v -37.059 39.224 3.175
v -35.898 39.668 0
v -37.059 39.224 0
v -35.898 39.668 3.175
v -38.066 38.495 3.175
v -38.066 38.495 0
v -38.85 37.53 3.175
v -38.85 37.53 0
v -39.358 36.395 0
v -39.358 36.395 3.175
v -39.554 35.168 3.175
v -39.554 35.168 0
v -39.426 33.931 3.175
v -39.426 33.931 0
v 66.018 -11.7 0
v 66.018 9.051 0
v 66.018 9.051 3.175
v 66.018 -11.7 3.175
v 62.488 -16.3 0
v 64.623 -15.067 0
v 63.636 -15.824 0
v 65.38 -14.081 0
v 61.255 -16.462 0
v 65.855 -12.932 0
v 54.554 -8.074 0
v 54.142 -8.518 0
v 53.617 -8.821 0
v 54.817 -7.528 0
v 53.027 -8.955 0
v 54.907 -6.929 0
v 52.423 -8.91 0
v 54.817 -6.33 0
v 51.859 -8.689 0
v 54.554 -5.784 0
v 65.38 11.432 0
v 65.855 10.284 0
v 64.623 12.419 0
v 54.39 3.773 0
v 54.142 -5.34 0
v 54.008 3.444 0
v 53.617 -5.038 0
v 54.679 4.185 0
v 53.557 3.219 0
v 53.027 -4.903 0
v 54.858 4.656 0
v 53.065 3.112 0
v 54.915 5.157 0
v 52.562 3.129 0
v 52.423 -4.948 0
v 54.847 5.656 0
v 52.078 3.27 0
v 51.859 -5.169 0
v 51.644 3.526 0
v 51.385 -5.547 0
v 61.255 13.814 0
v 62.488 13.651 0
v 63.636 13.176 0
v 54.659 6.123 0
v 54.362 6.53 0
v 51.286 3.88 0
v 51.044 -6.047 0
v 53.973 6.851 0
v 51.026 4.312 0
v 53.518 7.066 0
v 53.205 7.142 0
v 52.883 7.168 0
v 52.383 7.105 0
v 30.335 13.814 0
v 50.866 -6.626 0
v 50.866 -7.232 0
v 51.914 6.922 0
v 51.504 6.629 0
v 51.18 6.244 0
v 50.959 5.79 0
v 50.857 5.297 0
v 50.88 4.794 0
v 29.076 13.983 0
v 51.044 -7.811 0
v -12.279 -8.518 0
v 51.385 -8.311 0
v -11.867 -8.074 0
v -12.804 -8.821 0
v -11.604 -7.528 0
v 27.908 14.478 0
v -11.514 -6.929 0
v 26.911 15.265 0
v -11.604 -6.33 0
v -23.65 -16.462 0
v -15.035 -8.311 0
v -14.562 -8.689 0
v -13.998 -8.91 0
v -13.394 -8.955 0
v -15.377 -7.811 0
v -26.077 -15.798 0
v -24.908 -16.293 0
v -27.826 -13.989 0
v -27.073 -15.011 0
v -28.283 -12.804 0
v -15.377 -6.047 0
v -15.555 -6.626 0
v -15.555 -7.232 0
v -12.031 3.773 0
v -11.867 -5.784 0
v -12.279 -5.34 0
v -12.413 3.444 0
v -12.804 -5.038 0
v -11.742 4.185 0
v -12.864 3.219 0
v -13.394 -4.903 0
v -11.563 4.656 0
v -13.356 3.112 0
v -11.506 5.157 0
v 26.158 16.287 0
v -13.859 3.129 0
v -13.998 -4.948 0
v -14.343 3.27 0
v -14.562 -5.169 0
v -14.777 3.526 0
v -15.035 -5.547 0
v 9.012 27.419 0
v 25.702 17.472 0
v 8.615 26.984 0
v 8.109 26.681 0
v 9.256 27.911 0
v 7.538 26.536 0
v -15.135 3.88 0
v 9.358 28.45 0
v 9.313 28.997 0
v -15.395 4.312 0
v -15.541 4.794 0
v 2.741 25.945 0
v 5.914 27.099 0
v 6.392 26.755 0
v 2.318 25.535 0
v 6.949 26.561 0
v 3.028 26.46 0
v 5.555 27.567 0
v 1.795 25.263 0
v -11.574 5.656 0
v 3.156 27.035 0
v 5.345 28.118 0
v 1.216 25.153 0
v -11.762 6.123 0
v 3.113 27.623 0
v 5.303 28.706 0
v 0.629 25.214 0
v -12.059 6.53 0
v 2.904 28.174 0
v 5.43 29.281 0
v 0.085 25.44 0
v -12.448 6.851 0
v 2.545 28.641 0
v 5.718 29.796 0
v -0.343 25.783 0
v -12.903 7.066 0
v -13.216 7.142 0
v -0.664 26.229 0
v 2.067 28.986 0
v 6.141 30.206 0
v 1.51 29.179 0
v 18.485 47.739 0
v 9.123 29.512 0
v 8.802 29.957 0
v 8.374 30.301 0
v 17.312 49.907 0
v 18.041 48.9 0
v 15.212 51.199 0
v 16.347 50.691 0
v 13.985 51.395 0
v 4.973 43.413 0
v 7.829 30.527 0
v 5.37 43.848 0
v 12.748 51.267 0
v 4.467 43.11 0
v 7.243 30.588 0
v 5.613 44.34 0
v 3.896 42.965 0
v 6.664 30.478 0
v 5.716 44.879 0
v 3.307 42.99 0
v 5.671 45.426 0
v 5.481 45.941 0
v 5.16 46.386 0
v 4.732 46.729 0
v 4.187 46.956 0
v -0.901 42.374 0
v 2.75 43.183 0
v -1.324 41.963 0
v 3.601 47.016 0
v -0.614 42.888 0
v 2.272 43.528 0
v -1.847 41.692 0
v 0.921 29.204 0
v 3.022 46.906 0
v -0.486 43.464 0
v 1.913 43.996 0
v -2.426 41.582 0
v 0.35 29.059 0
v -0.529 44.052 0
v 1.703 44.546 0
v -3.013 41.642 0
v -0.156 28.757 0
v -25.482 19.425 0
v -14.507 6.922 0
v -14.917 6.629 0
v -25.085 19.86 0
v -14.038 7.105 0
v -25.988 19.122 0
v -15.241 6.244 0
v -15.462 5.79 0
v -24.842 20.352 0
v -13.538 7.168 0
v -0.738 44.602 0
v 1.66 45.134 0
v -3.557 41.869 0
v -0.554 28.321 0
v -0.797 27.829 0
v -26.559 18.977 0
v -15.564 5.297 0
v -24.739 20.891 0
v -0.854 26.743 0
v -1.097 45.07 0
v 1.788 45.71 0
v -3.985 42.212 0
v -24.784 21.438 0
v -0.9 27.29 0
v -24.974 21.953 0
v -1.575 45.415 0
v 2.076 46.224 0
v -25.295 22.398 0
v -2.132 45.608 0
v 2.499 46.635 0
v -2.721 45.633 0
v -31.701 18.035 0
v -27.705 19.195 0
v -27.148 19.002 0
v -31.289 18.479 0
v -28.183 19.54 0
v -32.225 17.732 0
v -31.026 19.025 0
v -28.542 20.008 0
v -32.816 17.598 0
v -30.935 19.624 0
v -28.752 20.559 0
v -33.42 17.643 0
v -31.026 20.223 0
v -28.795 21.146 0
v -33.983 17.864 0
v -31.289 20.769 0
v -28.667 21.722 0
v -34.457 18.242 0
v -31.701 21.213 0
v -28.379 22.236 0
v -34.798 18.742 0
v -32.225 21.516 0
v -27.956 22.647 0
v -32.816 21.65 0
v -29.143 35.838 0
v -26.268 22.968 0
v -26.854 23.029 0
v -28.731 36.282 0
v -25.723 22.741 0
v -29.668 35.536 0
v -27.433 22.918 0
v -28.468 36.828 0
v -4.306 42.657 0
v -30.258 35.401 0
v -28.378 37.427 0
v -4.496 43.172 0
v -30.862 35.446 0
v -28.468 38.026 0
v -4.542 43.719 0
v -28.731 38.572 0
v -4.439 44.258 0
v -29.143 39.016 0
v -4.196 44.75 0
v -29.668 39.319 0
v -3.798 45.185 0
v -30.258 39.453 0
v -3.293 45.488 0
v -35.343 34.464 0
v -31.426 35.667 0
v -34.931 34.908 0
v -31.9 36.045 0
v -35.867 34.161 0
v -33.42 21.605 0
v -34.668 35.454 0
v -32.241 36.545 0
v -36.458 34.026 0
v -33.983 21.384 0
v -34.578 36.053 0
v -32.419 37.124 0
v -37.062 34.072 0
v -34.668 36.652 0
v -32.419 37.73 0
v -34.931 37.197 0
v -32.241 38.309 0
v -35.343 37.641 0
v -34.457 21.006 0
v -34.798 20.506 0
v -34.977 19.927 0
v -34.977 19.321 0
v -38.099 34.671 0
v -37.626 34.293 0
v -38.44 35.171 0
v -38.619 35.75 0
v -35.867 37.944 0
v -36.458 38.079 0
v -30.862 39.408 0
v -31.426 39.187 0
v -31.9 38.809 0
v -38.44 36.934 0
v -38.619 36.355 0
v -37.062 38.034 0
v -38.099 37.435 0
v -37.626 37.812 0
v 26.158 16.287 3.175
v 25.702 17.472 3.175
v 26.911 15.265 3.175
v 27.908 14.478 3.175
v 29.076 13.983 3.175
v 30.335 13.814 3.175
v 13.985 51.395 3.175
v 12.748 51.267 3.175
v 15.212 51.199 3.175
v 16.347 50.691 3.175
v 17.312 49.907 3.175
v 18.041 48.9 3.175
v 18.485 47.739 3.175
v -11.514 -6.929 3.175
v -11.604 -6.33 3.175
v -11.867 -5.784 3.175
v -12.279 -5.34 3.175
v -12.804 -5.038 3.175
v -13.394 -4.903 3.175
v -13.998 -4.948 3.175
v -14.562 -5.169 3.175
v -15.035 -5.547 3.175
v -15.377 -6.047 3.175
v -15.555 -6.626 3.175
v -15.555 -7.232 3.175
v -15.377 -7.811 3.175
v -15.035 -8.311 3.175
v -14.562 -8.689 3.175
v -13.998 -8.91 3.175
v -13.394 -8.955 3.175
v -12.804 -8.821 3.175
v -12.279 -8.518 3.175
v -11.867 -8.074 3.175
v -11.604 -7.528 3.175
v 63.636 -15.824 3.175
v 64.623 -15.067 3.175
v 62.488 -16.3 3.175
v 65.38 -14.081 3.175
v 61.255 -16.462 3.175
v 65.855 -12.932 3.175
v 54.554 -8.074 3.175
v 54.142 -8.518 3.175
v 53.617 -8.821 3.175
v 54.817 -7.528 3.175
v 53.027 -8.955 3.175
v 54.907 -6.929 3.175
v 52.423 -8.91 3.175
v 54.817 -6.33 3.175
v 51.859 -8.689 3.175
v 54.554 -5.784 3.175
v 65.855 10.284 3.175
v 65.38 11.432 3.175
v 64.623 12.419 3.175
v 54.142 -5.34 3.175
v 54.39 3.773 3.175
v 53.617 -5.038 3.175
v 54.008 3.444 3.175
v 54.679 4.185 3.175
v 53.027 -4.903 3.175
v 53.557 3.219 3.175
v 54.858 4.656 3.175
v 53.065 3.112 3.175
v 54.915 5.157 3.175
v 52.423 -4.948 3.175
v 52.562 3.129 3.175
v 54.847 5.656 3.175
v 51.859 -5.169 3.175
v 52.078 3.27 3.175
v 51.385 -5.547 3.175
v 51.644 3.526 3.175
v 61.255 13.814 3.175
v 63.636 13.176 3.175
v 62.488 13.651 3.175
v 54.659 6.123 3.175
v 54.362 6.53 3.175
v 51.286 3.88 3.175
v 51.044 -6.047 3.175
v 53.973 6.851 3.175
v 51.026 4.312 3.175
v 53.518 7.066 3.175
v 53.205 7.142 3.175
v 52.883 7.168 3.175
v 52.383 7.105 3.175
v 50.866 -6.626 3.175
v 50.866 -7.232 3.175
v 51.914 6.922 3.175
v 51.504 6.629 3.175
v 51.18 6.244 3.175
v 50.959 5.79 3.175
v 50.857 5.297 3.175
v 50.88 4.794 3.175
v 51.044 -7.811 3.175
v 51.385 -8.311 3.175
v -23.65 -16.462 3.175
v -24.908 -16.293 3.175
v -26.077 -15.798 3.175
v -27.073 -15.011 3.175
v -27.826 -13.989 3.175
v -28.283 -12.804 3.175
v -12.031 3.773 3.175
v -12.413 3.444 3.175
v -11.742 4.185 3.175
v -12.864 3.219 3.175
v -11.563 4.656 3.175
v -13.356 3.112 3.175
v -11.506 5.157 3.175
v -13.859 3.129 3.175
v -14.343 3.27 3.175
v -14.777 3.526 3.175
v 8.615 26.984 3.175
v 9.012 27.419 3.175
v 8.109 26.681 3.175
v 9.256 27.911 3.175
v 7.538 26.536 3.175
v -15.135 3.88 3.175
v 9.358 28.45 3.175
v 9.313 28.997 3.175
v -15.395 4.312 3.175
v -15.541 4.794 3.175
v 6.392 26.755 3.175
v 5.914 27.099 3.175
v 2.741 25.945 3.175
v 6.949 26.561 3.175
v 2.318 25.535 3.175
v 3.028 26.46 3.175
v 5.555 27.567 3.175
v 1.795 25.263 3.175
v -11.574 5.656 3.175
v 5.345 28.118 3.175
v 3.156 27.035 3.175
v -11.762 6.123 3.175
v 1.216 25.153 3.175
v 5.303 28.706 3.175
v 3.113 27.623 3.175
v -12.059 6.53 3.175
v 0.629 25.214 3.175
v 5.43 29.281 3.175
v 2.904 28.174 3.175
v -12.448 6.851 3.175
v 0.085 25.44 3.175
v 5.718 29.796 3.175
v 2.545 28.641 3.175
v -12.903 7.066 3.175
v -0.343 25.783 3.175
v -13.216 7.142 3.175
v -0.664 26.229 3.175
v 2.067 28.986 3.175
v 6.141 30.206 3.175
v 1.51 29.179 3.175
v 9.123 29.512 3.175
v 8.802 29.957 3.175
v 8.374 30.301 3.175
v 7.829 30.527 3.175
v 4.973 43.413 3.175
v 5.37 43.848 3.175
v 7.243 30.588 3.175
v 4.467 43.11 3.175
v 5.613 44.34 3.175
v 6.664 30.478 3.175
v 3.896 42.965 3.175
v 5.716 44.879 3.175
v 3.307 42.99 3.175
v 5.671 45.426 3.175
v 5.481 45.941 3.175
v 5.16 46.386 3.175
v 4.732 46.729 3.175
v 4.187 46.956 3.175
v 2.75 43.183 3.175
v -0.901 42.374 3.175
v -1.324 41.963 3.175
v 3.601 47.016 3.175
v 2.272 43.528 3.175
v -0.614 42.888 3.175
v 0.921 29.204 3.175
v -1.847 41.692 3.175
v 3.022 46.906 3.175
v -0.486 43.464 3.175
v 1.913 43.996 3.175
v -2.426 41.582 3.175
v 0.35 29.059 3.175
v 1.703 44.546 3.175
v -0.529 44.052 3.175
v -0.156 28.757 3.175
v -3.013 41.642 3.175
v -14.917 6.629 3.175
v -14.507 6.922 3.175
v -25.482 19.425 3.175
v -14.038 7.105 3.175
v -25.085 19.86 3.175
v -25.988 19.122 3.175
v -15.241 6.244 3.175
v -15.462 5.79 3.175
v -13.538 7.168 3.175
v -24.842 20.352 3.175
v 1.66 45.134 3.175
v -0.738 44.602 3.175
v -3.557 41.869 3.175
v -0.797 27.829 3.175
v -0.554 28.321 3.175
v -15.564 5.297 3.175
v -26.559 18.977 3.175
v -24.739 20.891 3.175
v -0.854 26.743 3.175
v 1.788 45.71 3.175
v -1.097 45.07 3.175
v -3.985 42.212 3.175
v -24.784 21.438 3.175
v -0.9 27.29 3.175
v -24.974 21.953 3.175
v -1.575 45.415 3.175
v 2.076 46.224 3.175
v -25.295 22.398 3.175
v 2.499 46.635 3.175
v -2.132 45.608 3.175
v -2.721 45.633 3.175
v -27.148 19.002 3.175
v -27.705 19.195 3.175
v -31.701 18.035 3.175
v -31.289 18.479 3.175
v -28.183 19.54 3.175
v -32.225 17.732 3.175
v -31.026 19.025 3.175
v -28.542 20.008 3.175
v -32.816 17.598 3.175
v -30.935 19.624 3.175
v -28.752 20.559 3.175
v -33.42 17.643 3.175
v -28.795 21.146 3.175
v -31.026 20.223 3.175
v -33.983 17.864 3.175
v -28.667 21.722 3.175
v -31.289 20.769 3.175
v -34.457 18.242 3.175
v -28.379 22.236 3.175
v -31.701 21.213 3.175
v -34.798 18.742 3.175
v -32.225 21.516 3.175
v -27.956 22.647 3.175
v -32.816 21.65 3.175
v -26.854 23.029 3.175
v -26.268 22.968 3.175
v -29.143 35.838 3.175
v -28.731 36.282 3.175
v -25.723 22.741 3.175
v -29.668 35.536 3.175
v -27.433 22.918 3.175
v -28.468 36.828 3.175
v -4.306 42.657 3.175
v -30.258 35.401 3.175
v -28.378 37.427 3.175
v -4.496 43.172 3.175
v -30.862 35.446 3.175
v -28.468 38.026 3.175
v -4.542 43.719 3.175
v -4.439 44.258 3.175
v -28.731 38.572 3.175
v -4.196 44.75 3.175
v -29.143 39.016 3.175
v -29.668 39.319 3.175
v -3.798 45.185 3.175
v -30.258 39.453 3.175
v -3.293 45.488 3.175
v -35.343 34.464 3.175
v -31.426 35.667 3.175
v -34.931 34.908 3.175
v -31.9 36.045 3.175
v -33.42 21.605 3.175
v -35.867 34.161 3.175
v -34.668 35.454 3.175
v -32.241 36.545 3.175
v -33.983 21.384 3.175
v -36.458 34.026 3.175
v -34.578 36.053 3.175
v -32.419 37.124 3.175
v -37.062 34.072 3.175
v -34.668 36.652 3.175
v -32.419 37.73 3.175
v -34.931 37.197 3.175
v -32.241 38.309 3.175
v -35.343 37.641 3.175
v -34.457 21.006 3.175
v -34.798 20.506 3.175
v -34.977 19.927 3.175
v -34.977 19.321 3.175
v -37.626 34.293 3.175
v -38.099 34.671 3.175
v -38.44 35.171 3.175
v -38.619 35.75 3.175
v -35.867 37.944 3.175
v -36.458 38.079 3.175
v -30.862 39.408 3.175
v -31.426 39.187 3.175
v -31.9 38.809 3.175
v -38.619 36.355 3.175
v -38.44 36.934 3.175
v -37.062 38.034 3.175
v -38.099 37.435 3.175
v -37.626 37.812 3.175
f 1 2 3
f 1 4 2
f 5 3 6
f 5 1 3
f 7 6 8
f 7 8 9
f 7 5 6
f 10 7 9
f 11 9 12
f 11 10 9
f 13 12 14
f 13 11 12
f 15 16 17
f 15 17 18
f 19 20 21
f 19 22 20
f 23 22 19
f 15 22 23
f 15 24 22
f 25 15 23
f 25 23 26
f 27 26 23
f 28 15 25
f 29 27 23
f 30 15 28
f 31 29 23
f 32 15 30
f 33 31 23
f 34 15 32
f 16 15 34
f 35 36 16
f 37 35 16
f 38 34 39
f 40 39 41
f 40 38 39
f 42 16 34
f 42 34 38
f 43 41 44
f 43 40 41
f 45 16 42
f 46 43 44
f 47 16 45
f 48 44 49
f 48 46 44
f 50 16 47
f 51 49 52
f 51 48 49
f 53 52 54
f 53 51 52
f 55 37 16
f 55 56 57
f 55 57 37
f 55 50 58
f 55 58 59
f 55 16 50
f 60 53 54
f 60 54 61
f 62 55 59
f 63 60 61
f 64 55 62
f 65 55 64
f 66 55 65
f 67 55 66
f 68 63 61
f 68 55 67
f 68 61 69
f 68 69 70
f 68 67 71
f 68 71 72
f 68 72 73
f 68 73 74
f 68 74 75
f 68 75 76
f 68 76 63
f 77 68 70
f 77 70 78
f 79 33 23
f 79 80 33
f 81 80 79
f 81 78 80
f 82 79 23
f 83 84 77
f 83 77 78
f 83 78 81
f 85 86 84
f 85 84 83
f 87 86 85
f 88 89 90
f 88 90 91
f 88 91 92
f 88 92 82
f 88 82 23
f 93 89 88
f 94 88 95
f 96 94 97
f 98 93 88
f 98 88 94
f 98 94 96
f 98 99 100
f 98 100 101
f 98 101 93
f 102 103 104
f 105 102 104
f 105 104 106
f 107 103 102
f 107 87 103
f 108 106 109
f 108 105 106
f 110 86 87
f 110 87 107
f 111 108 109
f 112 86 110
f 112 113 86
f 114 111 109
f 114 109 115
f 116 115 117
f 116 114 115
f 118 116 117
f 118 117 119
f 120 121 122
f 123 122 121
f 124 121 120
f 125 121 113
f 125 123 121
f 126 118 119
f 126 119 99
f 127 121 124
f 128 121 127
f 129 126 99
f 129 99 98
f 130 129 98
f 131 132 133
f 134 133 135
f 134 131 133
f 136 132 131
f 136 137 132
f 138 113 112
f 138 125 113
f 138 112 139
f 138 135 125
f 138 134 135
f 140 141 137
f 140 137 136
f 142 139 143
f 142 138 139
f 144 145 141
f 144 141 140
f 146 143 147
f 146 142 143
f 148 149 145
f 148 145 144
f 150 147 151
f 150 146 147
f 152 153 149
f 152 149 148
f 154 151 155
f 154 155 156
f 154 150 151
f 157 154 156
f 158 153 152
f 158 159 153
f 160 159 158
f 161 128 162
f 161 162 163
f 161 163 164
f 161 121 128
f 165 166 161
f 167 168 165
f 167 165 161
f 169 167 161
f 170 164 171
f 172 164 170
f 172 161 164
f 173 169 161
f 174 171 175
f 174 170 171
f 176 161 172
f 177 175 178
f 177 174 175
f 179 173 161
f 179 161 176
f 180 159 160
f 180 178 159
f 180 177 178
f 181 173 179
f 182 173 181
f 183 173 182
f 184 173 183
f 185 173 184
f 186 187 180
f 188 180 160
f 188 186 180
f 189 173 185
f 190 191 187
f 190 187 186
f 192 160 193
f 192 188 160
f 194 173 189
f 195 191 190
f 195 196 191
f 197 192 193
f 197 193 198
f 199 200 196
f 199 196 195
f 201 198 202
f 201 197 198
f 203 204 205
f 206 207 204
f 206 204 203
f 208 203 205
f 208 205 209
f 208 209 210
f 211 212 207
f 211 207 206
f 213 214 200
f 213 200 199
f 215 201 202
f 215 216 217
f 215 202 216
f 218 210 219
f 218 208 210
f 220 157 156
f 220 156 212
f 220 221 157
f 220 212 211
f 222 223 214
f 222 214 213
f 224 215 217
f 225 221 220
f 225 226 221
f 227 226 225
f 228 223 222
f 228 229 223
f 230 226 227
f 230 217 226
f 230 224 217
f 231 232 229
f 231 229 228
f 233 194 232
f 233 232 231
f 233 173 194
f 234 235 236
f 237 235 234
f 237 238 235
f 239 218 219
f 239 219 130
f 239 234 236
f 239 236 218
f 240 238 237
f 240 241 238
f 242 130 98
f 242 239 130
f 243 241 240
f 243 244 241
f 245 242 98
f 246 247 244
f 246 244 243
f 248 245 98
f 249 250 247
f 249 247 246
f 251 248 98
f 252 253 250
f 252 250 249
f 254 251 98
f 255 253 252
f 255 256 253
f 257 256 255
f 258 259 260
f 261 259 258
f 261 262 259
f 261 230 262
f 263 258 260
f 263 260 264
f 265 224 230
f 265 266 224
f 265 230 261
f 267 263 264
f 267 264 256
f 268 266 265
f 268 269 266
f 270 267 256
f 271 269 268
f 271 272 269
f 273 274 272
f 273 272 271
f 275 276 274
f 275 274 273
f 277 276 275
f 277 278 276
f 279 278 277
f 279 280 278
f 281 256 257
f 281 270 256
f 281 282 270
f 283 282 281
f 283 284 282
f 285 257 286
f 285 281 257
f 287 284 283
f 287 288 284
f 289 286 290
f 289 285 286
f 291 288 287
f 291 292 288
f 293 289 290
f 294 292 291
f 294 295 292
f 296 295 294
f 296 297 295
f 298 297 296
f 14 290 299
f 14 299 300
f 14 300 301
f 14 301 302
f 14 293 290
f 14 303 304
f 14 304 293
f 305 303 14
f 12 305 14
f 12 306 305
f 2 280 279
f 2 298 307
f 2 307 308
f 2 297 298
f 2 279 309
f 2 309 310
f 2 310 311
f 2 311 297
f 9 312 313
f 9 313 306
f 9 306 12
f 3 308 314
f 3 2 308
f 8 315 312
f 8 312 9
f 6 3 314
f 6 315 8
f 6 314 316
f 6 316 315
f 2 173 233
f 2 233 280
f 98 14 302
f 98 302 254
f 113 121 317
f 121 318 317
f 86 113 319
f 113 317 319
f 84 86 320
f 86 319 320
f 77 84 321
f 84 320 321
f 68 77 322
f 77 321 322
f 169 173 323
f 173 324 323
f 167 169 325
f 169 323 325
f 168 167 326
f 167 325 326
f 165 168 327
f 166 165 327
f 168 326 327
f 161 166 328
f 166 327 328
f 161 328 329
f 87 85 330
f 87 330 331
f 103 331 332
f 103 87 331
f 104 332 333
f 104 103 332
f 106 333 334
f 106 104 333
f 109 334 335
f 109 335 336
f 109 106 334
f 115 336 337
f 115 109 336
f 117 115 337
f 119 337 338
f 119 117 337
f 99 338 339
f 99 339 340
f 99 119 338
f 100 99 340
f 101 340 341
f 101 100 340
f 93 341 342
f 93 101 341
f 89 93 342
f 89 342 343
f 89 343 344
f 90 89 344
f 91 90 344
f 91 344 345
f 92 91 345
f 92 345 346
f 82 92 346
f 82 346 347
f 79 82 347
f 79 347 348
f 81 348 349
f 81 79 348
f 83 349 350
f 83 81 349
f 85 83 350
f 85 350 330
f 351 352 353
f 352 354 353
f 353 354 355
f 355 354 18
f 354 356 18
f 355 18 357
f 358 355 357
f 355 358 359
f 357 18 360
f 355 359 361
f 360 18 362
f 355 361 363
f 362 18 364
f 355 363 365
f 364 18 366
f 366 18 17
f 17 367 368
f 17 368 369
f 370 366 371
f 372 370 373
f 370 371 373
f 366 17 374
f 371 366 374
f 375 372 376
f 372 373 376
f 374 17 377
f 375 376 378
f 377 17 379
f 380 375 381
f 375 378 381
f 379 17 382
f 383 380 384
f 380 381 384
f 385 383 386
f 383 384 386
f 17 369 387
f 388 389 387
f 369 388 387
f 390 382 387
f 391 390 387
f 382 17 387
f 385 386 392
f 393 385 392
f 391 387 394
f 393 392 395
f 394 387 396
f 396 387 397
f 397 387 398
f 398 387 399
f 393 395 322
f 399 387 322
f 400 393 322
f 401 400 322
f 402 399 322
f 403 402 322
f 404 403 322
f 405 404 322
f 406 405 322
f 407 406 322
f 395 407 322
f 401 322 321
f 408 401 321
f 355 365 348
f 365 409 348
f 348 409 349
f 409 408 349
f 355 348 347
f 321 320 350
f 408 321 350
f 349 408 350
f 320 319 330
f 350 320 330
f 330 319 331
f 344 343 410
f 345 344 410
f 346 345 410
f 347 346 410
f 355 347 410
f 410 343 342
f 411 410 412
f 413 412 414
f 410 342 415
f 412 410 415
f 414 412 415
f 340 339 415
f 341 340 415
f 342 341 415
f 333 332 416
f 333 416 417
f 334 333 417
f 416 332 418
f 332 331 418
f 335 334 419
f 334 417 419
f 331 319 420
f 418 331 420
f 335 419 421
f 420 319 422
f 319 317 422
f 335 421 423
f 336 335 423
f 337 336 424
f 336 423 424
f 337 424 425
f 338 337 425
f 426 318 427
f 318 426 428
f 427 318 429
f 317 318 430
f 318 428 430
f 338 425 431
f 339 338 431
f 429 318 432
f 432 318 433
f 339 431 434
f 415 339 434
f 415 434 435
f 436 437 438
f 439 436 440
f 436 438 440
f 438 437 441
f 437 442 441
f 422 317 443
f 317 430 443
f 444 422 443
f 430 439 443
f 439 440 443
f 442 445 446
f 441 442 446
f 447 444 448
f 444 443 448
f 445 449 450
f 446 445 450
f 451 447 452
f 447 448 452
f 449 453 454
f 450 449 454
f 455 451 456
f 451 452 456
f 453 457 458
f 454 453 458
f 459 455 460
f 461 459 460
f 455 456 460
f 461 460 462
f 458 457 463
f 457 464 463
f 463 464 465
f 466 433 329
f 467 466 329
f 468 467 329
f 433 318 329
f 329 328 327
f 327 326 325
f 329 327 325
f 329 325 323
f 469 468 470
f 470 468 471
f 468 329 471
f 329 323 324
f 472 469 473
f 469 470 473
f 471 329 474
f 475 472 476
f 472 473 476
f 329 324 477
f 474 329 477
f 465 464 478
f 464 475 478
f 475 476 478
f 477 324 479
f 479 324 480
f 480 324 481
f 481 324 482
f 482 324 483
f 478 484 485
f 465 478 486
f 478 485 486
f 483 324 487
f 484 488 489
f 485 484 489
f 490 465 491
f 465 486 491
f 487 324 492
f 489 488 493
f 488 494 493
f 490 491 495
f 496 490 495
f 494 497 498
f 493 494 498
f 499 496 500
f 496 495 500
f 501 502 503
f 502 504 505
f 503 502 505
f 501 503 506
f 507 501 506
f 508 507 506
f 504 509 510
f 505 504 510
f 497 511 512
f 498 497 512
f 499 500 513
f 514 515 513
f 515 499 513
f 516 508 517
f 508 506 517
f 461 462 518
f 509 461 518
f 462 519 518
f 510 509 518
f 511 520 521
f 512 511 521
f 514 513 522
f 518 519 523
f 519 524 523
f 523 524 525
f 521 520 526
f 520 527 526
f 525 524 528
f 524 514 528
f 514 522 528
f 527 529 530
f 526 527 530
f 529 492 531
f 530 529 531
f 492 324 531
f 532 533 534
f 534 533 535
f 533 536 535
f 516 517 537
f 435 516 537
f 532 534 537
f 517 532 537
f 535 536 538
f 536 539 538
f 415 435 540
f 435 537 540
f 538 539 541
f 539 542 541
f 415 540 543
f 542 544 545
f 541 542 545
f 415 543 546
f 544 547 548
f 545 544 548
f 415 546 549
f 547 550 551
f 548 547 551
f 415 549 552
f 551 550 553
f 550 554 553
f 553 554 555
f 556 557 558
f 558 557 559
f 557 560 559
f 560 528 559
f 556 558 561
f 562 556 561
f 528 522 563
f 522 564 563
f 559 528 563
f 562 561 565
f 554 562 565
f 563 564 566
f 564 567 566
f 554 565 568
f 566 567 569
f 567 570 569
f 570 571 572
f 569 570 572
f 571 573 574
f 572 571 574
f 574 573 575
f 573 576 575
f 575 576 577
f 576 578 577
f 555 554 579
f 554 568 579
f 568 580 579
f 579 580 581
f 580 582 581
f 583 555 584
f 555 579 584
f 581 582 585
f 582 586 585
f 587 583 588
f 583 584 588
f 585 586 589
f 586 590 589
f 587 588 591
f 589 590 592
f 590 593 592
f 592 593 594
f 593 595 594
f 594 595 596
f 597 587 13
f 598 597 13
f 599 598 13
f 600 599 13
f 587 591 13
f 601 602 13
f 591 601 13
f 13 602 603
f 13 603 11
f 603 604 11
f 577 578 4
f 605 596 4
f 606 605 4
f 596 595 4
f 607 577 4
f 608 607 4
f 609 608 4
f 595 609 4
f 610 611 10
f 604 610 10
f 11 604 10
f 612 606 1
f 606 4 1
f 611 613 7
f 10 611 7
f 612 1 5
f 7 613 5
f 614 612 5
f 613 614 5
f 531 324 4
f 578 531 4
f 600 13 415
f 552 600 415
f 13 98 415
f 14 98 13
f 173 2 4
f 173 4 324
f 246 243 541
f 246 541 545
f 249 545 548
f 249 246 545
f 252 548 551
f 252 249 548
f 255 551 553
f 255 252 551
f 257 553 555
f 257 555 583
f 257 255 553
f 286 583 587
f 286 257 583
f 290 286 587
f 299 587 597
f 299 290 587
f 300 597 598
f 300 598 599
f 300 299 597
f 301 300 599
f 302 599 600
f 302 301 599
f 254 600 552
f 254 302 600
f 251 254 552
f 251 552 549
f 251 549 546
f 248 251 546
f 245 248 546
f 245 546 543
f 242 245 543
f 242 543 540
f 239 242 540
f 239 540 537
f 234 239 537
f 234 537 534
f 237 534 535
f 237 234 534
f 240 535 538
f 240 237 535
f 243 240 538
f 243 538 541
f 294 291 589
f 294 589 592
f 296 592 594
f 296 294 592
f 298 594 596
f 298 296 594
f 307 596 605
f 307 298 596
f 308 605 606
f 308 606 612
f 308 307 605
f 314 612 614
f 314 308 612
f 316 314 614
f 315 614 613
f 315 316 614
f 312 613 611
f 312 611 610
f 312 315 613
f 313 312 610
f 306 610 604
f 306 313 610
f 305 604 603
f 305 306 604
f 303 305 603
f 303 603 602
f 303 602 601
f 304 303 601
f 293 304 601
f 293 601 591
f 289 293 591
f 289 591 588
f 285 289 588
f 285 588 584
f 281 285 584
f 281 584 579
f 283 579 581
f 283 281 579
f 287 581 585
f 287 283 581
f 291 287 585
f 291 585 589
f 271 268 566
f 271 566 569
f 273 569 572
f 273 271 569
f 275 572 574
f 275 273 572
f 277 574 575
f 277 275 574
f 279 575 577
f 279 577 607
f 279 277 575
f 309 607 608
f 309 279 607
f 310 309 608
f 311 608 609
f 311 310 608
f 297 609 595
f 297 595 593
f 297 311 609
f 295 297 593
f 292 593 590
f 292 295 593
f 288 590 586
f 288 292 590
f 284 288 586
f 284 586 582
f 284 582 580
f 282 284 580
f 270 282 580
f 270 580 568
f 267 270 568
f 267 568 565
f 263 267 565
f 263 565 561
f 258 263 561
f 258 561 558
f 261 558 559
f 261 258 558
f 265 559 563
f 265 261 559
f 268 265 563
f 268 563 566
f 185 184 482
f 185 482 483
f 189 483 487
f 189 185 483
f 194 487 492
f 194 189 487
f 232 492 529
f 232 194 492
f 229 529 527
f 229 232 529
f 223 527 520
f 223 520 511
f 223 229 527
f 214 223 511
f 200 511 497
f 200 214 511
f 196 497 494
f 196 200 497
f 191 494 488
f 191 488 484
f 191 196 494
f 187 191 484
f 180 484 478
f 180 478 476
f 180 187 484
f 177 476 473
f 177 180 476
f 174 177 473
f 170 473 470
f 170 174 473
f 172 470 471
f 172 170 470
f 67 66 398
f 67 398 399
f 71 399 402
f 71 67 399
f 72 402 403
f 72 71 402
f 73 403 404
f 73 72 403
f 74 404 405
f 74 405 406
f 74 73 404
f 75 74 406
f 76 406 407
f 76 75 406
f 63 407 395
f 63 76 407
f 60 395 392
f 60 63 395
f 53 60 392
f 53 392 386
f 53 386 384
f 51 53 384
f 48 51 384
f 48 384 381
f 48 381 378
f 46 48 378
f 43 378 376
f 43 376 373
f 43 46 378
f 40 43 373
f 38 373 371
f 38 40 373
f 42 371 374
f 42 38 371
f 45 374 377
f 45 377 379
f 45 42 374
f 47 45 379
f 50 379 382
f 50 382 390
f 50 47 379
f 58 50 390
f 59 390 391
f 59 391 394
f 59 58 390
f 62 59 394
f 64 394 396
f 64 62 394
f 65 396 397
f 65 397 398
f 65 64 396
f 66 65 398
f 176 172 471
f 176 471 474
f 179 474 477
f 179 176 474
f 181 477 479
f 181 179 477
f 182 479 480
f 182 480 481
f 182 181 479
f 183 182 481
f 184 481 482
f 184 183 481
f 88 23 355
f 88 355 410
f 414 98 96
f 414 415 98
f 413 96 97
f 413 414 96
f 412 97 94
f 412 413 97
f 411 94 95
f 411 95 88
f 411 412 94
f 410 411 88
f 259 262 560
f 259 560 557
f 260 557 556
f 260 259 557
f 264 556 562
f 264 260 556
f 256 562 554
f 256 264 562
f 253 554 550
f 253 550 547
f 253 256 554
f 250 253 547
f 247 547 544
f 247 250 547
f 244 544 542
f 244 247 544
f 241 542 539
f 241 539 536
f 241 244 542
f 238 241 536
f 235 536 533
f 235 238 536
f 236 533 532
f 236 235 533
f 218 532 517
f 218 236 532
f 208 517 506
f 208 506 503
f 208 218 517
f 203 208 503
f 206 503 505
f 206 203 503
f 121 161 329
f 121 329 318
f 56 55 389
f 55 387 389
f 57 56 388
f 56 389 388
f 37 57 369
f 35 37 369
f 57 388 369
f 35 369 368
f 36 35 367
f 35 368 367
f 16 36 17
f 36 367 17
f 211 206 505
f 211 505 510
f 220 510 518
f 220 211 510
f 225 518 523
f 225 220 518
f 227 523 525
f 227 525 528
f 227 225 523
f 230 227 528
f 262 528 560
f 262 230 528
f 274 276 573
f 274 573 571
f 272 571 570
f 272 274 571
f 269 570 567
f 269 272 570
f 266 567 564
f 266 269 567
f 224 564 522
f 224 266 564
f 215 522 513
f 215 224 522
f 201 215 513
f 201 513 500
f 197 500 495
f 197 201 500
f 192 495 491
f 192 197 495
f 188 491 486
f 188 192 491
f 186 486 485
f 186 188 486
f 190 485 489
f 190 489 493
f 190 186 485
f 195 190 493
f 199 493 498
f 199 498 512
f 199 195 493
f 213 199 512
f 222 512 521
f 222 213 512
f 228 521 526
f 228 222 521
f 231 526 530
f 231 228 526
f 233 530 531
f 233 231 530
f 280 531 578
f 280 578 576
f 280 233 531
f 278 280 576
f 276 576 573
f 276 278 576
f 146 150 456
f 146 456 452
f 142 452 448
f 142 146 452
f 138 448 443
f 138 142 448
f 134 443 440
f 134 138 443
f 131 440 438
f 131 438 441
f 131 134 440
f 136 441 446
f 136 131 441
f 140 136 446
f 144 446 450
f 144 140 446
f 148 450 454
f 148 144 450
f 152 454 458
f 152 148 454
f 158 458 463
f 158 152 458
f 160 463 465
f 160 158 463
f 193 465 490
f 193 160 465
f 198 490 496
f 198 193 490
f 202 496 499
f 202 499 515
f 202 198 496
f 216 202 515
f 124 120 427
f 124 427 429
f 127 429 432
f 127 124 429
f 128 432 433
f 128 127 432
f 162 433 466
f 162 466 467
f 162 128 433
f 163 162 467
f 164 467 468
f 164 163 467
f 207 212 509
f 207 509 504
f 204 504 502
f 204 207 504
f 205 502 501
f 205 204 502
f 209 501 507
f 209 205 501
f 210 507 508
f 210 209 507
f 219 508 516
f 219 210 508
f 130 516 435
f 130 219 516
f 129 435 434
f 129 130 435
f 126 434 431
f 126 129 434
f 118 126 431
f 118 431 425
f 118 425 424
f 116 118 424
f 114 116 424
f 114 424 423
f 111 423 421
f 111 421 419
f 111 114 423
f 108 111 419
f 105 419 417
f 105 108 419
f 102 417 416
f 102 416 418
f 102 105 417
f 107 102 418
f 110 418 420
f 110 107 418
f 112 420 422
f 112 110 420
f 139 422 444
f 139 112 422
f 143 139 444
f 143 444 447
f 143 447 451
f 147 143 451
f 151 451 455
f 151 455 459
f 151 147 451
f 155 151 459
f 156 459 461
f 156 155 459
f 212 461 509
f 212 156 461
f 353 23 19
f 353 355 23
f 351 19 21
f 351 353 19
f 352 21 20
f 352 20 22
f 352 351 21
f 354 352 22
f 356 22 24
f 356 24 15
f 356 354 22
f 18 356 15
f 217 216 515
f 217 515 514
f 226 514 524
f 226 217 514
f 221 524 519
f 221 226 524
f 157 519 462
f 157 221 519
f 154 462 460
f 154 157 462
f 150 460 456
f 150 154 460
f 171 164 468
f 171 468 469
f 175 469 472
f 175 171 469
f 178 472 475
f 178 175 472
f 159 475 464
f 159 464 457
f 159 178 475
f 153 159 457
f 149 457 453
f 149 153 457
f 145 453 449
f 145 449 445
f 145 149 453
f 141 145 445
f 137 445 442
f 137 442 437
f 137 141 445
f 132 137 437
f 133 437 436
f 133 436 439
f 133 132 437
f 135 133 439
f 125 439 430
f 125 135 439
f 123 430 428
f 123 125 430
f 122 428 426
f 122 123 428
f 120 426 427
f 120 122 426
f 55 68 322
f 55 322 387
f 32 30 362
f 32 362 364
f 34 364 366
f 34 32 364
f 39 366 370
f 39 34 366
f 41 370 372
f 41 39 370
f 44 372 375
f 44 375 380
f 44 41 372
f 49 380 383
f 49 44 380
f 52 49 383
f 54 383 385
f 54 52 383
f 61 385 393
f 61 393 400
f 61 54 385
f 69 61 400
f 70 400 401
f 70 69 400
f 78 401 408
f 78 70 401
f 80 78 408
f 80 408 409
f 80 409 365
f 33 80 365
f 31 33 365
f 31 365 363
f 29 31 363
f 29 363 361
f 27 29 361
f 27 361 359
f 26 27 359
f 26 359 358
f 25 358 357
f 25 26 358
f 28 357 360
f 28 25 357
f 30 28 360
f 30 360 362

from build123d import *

# Parameters (mm, degrees)
SKETCH1_R           = 2.032
SKETCH1_RX          = 2.032
SKETCH1_RY          = 2.031999502
BOSS_EXTRUDE1_DEPTH = 3.175
FILLET1_R           = 4.7625


with BuildPart() as part:
    # Sketch1 → Boss-Extrude1 (new body)
    with BuildSketch(Plane.XY):
        Polygon((-40.530490432, 38.563534157), (17.380628715, 52.371523419), (26.574151776, 13.813613269), (66.017725223, 13.813613269), (66.017725223, -16.462333503), (-27.410443695, -16.462333503), align=None)
        with Locations((-36.609618565, 36.052645813)):
            Circle(SKETCH1_R, mode=Mode.SUBTRACT)
        with Locations((-30.41013892, 37.427037361)):
            Circle(SKETCH1_R, mode=Mode.SUBTRACT)
        with Locations((-32.967480962, 19.624024753)):
            Circle(SKETCH1_R, mode=Mode.SUBTRACT)
        with Locations((52.87506012, -6.929134334)):
            Circle(SKETCH1_R, mode=Mode.SUBTRACT)
        with Locations((-13.545923607, -6.929134334)):
            Circle(SKETCH1_R, mode=Mode.SUBTRACT)
        with Locations(Location((52.883061118, 5.135865666), (0, 0, 90))):
            Ellipse(SKETCH1_RX, SKETCH1_RY, mode=Mode.SUBTRACT)
        with Locations(Location((-13.537922609, 5.135865666), (0, 0, 90))):
            Ellipse(SKETCH1_RX, SKETCH1_RY, mode=Mode.SUBTRACT)
        with BuildLine():
            ThreePointArc((9.01240199, 27.419307073), (9.31297022, 28.997375114), (8.37364252, 30.300564844))
            ThreePointArc((8.37364252, 30.300564844), (5.345303247, 28.117764523), (9.01240199, 27.419307073))
        make_face(mode=Mode.SUBTRACT)
        with BuildLine():
            ThreePointArc((5.370264386, 43.847928133), (5.670832616, 45.425996173), (4.731504917, 46.729185904))
            ThreePointArc((4.731504917, 46.729185904), (1.703165643, 44.546385582), (5.370264386, 43.847928133))
        make_face(mode=Mode.SUBTRACT)
        with BuildLine():
            ThreePointArc((-3.556986303, 41.868804303), (-0.528647029, 44.051604625), (-4.195745772, 44.750062074))
            ThreePointArc((-4.195745772, 44.750062074), (-4.496314002, 43.171994034), (-3.556986303, 41.868804303))
        make_face(mode=Mode.SUBTRACT)
        with BuildLine():
            ThreePointArc((0.085151301, 25.440183244), (3.113490574, 27.622983565), (-0.553608169, 28.321441014))
            ThreePointArc((-0.553608169, 28.321441014), (-0.854176399, 26.743372974), (0.085151301, 25.440183244))
        make_face(mode=Mode.SUBTRACT)
        with BuildLine():
            ThreePointArc((-25.08473606, 19.860153557), (-24.78416783, 21.438221597), (-25.723495529, 22.741411327))
            ThreePointArc((-25.723495529, 22.741411327), (-28.751834803, 20.558611006), (-25.08473606, 19.860153557))
        make_face(mode=Mode.SUBTRACT)
    extrude(amount=BOSS_EXTRUDE1_DEPTH)

    # Fillet1
    fillet1_edges = [part.edges().sort_by_distance(p)[0] for p in [
        (-40.530490432, 38.563534157, 1.5875),
        (17.380628715, 52.371523419, 1.5875),
        (26.574151776, 13.813613269, 1.5875),
        (66.017725223, 13.813613269, 1.5875),
        (66.017725223, -16.462333503, 1.5875),
        (-27.410443695, -16.462333503, 1.5875),
    ]]
    fillet(fillet1_edges, radius=FILLET1_R)


solid = part.part
